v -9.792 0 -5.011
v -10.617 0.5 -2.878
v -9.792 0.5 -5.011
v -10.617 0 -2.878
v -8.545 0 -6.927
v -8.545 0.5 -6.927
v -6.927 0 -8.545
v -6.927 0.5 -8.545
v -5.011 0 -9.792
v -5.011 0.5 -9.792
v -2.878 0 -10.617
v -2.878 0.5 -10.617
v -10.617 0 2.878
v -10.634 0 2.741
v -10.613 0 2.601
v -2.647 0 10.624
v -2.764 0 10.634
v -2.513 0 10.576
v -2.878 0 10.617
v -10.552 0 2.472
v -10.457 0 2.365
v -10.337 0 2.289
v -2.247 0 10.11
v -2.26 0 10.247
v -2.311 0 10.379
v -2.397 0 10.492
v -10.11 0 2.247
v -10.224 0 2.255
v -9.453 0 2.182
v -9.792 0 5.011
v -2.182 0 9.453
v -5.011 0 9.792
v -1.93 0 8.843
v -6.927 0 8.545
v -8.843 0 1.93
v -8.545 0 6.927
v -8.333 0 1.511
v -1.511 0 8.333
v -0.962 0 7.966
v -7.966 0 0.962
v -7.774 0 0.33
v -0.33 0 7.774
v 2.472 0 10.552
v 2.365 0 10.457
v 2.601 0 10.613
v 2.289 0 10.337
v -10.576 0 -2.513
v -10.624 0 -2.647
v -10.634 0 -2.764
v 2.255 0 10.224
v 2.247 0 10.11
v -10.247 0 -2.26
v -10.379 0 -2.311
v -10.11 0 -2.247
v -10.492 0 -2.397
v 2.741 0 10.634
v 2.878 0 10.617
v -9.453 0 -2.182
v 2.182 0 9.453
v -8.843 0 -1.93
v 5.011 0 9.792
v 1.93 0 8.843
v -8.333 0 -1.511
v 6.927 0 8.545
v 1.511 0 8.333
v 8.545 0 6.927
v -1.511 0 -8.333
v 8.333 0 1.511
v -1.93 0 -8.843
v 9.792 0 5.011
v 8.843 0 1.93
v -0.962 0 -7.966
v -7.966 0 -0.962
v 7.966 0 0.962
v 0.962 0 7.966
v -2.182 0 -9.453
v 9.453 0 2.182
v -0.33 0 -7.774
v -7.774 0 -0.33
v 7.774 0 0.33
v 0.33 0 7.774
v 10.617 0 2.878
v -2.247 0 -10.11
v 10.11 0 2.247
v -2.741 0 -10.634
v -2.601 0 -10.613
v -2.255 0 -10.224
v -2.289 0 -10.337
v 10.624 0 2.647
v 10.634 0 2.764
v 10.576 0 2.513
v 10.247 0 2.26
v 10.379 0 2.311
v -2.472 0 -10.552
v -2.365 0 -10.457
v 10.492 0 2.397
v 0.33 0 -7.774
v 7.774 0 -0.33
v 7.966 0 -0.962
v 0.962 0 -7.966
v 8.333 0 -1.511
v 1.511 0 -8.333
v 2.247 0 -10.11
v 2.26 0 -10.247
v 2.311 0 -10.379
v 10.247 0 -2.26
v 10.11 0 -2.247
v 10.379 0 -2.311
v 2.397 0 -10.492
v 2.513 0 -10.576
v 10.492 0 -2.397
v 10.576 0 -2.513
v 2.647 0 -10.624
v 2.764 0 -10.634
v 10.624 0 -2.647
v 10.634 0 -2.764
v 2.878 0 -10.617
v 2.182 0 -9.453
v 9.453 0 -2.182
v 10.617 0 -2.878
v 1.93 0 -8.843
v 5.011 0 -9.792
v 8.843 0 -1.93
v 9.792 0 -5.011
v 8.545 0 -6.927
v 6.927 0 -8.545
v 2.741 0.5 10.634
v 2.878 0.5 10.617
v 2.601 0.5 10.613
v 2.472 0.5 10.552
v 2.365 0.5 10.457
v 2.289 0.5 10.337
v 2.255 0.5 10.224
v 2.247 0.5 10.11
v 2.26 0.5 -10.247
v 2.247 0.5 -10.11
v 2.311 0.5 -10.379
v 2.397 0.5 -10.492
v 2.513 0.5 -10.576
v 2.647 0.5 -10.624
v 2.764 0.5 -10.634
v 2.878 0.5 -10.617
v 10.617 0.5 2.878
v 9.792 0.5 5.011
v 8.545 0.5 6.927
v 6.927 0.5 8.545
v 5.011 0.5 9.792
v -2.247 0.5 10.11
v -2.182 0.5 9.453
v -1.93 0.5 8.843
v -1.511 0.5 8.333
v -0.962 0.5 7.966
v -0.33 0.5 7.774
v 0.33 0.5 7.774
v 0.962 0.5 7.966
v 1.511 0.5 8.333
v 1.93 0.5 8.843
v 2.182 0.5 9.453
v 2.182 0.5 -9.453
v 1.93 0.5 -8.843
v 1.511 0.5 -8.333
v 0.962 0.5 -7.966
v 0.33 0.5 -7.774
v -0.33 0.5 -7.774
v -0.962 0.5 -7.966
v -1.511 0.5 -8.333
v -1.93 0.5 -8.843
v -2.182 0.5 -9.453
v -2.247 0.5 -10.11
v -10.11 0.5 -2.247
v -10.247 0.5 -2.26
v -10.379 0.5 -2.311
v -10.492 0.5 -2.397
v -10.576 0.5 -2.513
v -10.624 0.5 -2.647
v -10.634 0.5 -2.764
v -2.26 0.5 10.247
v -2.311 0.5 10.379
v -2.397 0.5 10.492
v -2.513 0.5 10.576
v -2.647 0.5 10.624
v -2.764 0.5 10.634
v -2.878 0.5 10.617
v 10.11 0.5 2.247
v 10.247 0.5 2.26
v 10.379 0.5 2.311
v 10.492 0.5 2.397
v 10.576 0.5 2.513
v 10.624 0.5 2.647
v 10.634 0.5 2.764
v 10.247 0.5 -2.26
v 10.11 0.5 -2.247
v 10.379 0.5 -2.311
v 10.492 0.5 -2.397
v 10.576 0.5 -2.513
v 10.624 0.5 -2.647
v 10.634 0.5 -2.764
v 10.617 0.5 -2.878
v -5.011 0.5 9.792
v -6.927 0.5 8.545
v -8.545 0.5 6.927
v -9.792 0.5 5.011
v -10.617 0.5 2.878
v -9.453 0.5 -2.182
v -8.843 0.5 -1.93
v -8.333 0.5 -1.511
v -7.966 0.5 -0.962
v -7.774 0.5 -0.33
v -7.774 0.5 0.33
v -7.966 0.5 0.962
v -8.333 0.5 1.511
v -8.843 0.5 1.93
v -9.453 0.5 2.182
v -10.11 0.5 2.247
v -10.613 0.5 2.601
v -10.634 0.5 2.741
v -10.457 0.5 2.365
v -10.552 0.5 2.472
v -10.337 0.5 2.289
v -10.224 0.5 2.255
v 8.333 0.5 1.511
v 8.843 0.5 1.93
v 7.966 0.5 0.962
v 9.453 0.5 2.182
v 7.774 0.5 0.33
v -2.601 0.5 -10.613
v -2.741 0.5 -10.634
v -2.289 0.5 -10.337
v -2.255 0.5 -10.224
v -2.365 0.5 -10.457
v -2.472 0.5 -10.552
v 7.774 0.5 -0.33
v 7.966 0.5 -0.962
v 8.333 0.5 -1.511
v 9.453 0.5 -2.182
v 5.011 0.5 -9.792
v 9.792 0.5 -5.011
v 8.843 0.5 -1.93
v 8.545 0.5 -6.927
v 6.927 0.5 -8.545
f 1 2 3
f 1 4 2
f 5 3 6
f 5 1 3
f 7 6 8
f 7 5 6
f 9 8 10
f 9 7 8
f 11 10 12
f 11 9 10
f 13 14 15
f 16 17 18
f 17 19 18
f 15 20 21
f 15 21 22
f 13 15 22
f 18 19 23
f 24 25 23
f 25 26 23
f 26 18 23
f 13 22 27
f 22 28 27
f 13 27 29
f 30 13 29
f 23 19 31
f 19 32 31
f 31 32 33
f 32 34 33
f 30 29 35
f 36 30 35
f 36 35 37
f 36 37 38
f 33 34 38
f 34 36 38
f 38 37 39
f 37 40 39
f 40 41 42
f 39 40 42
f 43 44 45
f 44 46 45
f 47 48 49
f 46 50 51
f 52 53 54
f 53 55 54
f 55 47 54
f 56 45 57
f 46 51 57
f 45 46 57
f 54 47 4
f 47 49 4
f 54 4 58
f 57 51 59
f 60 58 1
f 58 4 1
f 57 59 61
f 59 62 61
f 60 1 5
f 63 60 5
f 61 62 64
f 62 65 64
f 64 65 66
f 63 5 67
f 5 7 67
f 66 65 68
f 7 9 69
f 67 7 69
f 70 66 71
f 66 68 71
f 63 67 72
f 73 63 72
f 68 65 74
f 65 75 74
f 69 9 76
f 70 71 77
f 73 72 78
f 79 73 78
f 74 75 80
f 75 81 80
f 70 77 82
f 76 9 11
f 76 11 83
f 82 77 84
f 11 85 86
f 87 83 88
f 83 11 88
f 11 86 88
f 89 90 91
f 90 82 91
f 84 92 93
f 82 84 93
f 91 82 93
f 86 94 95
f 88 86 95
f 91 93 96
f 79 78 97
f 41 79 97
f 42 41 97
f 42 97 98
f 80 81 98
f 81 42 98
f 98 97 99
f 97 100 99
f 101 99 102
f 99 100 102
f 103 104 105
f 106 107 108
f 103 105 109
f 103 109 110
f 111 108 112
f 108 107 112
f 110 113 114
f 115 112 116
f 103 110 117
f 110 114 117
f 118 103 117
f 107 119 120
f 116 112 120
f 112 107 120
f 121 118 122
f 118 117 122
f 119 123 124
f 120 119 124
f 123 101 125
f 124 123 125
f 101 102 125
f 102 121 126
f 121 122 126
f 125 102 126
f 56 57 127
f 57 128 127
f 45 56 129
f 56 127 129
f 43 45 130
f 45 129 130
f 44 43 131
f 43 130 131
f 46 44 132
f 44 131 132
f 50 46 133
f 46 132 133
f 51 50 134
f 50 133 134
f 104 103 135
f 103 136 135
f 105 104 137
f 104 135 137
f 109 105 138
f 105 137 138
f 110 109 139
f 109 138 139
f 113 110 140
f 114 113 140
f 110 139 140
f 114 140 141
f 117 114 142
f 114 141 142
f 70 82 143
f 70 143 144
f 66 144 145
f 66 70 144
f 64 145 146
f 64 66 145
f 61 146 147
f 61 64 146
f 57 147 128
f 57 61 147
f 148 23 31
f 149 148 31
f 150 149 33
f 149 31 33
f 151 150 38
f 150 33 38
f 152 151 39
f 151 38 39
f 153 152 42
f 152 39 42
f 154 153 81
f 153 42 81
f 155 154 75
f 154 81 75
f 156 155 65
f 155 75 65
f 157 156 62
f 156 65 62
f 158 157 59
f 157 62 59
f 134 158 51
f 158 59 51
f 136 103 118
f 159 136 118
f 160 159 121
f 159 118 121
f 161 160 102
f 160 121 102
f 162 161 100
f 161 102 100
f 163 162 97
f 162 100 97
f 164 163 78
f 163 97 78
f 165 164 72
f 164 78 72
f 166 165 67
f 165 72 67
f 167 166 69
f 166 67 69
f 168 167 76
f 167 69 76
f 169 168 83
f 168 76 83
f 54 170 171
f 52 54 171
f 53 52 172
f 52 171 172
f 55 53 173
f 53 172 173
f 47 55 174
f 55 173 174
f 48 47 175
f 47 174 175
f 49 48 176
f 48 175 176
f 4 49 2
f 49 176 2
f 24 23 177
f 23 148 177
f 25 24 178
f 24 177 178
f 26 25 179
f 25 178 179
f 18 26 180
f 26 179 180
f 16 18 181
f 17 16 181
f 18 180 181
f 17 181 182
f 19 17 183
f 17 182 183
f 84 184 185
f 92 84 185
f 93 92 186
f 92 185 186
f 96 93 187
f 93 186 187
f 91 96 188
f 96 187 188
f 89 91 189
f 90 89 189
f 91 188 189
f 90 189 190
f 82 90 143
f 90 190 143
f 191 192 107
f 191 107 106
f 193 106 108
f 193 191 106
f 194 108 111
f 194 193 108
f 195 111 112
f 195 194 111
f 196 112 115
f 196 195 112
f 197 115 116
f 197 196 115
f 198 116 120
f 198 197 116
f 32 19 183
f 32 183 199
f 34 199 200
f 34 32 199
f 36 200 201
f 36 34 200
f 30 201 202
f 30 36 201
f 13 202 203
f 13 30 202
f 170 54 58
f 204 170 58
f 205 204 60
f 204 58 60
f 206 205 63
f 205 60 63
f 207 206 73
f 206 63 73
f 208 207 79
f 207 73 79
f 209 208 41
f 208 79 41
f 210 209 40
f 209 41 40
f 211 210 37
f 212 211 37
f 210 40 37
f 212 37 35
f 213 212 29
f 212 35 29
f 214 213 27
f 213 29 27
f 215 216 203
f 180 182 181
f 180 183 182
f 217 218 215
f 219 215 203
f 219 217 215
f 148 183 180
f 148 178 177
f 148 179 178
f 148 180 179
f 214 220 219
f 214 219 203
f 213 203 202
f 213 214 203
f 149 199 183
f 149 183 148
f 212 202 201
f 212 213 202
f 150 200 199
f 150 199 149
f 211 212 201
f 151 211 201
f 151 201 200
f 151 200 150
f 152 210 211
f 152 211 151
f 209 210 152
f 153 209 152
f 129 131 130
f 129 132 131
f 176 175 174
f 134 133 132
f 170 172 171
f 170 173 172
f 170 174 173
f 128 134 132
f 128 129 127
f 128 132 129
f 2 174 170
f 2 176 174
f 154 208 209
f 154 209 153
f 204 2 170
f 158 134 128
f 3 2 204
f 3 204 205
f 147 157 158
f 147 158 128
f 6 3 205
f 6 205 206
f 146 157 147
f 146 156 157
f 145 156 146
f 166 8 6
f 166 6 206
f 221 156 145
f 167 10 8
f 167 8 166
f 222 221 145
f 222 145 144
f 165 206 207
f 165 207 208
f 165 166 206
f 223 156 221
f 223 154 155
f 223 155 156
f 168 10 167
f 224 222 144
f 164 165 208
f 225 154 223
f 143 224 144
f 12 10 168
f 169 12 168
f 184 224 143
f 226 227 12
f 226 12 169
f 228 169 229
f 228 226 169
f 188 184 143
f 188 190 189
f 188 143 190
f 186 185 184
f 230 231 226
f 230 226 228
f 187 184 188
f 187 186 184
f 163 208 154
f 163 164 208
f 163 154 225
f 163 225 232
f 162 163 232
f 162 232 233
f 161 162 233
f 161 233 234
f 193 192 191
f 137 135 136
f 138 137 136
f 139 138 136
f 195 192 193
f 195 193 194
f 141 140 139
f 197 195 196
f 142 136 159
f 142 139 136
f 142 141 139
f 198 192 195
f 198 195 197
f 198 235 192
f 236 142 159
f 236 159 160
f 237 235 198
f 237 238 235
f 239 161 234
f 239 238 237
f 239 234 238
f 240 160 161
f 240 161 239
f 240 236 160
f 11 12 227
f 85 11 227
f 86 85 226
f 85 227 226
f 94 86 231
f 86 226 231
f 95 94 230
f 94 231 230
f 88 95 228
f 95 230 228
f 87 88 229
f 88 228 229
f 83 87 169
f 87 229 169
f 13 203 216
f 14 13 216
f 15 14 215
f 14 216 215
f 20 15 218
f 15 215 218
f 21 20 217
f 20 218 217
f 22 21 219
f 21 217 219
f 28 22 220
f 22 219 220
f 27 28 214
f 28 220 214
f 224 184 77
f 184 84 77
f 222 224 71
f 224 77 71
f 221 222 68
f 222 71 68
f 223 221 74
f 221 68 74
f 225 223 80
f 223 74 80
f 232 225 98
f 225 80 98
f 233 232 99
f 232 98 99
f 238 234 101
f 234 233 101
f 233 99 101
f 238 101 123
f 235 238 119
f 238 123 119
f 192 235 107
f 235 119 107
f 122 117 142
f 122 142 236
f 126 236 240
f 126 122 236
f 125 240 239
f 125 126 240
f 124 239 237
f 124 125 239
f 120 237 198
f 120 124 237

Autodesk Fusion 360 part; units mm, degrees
sketch "Sketch1" plane through (0, 0, 0) normal (0, 1, 0) x (1, 0, 0)
  circle A0 centre (0, 0) radius 10 construction
  circle A1 centre (10, 0) radius 2.25
  circle A2 centre (0, 10) radius 2.25
  circle A3 centre (-10, 0) radius 2.25
  circle A4 centre (0, -10) radius 2.25
  circle A5 centre (0, 0) radius 11
  dimension "d1" = 20
  dimension "d2" = 4.5
  dimension "d4" = 360
  dimension "d5" = 22
extrude "Extrude1" add sketch "Sketch1" along normal blind 0.5 contours A1 A2 A3 A4 A5
fillet "Fillet1" radius 0.5 8 edges at (-2.1042, 0.25, 10.7969) (2.1042, 0.25, 10.7969) (-10.7969, 0.25, 2.1042) (-10.7969, 0.25, -2.1042) (-2.1042, 0.25, -10.7969) (2.1042, 0.25, -10.7969) (10.7969, 0.25, -2.1042) (10.7969, 0.25, 2.1042)
